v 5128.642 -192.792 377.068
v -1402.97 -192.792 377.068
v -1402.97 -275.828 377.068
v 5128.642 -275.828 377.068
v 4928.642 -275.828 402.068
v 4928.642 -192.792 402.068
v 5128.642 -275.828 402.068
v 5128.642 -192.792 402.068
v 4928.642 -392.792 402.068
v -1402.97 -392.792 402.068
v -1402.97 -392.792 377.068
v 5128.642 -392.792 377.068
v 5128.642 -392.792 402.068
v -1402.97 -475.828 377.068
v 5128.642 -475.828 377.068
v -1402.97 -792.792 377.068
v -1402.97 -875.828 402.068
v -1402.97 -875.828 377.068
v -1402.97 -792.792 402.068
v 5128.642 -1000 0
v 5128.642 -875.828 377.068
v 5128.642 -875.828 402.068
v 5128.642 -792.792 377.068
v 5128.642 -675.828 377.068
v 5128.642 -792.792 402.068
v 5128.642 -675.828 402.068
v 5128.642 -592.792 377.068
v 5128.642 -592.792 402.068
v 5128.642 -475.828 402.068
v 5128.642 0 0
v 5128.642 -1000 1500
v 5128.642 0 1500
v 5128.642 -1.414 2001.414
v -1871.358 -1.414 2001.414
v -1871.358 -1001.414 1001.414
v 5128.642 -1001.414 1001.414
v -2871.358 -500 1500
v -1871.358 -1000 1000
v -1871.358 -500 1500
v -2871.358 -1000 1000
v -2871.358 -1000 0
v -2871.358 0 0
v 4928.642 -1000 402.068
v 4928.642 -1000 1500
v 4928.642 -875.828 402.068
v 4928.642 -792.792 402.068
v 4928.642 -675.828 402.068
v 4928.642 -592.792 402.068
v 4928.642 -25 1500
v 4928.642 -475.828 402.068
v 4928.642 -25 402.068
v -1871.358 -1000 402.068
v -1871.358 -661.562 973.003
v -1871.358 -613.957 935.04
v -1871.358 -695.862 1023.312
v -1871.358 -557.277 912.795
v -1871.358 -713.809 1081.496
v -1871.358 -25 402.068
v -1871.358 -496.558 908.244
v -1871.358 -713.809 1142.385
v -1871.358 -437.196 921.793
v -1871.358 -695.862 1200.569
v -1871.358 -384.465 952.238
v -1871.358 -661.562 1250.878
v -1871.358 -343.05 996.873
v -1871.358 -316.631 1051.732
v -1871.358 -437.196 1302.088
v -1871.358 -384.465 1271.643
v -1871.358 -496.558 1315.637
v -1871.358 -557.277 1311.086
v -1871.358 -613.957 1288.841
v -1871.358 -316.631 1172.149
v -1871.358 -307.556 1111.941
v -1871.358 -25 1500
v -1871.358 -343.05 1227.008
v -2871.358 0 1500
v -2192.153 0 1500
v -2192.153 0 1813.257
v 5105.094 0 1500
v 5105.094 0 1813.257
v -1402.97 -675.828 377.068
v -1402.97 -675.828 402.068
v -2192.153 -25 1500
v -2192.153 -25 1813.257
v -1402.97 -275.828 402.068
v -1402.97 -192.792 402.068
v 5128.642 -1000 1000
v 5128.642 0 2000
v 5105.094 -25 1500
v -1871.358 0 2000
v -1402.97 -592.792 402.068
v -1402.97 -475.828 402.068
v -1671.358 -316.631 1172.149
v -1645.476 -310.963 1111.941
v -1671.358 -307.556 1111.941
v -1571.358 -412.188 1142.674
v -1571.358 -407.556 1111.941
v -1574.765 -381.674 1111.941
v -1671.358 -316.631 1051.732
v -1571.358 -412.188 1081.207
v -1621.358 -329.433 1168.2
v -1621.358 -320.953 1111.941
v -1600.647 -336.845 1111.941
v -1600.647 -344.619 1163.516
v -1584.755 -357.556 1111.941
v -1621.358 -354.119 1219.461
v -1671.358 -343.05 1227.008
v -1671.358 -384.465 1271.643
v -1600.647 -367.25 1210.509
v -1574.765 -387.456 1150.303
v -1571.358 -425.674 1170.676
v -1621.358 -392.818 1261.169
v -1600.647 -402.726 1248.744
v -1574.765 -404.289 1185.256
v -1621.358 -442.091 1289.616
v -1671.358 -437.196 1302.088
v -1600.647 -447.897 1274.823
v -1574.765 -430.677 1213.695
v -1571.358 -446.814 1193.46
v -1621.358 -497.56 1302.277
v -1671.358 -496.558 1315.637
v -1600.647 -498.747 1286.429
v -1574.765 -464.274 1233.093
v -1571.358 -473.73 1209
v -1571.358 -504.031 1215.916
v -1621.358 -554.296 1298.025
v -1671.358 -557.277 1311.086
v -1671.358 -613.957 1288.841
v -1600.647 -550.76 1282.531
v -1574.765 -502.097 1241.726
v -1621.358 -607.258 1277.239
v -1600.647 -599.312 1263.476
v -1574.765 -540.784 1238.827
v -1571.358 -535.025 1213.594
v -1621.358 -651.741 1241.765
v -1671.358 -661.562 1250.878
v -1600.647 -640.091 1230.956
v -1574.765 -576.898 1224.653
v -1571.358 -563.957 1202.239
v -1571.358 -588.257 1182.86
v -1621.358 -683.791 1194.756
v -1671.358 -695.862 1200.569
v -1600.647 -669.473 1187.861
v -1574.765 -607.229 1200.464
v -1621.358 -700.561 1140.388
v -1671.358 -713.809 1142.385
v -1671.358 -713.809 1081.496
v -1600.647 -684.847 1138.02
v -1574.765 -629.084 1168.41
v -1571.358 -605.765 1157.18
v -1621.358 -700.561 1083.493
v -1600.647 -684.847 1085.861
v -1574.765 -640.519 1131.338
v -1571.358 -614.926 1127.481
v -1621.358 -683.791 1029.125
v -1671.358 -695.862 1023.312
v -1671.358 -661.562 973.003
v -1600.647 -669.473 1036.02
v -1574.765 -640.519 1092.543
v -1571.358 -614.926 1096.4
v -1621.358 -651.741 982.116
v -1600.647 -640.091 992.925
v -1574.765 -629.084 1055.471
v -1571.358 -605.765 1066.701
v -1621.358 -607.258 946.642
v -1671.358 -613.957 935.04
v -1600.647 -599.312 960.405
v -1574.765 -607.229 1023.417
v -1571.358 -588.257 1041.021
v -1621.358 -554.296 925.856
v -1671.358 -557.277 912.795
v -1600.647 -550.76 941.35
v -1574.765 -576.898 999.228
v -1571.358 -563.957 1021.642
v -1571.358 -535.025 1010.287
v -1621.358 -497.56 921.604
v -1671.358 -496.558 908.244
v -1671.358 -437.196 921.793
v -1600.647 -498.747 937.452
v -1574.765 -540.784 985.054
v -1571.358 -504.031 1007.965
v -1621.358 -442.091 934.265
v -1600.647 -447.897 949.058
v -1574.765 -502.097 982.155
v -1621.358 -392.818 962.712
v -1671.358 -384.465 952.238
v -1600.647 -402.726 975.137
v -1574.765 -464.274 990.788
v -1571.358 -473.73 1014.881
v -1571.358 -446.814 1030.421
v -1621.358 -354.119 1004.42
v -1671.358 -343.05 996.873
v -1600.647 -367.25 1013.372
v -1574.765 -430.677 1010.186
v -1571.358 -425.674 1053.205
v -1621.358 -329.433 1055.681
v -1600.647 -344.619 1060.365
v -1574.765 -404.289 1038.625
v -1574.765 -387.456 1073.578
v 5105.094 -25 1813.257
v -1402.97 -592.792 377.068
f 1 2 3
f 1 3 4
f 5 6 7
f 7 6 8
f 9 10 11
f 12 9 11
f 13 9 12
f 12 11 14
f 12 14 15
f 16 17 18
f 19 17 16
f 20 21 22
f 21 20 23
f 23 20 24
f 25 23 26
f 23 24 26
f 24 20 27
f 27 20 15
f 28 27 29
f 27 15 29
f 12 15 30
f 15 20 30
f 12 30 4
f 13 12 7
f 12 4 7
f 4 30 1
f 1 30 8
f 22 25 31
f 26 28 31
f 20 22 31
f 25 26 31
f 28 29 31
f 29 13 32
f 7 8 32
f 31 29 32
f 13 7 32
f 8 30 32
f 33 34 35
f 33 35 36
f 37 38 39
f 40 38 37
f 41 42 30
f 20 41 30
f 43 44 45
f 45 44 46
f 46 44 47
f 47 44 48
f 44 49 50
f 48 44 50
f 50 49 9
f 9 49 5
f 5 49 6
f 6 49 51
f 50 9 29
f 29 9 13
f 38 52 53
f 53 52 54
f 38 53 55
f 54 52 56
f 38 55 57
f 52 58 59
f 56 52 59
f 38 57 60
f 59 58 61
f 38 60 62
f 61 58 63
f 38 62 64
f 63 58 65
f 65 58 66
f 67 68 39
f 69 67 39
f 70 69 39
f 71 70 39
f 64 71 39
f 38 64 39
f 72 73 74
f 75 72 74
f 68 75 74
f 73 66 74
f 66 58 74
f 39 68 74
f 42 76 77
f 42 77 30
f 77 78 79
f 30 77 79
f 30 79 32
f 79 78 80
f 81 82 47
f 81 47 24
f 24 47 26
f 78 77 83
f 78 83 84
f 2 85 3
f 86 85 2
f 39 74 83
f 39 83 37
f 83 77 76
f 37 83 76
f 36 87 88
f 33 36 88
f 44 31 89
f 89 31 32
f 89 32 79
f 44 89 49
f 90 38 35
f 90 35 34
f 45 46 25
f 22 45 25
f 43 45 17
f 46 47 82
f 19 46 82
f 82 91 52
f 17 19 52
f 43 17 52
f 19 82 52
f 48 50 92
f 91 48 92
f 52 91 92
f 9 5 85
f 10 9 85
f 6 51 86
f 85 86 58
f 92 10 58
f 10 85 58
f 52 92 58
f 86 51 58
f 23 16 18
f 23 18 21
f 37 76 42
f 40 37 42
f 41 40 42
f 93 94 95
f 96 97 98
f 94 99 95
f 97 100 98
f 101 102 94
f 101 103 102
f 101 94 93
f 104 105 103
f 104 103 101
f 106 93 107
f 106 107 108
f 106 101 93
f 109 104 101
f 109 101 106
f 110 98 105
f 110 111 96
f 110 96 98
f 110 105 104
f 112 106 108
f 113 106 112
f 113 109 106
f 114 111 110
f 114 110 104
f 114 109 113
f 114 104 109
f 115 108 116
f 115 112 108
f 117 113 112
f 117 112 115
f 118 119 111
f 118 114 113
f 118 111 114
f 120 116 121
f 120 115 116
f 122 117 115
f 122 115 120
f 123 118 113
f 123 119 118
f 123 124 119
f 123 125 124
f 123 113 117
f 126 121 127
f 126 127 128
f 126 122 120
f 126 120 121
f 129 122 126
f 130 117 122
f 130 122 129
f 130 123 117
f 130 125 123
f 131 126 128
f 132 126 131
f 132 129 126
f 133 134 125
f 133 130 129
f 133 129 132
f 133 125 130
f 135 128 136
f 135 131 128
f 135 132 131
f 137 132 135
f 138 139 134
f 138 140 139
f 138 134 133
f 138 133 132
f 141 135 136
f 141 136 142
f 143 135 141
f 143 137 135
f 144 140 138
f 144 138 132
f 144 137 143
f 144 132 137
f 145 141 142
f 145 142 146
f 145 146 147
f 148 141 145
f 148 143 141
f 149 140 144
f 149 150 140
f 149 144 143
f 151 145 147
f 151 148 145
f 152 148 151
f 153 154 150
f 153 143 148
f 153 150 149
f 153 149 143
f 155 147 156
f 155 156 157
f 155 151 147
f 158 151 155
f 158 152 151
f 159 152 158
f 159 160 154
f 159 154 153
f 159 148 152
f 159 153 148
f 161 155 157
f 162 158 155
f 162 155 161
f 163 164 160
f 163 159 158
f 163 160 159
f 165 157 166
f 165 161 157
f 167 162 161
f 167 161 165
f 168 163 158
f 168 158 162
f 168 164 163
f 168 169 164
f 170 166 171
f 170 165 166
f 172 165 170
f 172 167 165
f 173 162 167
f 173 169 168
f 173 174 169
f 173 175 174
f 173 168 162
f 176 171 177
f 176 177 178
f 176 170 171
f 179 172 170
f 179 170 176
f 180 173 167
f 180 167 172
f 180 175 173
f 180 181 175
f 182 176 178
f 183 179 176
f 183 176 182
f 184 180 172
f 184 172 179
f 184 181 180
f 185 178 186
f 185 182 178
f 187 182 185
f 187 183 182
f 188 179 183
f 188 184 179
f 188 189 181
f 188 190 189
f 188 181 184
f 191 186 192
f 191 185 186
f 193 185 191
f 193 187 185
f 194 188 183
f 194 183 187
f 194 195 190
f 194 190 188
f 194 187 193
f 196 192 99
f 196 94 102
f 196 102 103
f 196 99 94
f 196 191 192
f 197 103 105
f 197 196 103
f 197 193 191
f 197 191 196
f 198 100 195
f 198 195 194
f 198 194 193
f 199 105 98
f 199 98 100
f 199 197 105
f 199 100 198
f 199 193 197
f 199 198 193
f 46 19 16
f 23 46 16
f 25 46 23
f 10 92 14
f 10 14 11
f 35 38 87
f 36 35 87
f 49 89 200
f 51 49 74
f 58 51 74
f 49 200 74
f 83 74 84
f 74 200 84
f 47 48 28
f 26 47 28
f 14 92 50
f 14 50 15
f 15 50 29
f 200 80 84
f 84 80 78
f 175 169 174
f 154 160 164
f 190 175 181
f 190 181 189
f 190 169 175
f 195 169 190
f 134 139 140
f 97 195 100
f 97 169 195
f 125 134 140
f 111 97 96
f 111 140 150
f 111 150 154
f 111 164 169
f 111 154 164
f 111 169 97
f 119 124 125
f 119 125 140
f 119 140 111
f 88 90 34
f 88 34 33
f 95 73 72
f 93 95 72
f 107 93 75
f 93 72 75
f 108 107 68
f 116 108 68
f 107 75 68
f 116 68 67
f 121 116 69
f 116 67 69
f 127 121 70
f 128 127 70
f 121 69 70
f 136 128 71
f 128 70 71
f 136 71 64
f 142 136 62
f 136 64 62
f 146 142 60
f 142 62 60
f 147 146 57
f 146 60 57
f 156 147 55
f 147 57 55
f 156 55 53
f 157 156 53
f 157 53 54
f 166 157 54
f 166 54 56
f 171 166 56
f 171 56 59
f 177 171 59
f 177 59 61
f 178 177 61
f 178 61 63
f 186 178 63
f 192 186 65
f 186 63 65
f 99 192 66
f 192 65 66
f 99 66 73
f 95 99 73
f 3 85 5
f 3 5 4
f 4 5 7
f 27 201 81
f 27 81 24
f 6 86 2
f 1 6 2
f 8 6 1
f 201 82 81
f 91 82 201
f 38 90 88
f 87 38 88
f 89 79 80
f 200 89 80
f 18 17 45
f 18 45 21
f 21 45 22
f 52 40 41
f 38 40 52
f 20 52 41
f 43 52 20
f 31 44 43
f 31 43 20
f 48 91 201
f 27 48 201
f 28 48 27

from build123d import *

# Parameters (mm, degrees)
F1_DEPTH  = 1000
F2_W      = 7297.247172
F2_H      = 1572.696477
F3_DEPTH  = 25
F4_R      = 204.2673
F5_DEPTH  = 300
F6_SIZE   = 500
F7_R      = 100
F8_W      = 7151.451826
F8_H      = 83.035737
F9_DEPTH  = 25
F10_W     = 7000
F10_H     = 1414.213562
F11_DEPTH = 2


with BuildPart() as f1:
    # F0 (on Front) → F1 (new body)
    with BuildSketch(Plane.XZ):
        Polygon((-1871.357652, 1500), (-2871.357652, 1500), (-2871.357652, 0), (5128.642348, 0), (5128.642348, 1500), (4928.642348, 1500), (4928.642348, 402.068209), (-1871.357652, 402.068209), align=None)
    extrude(amount=F1_DEPTH)

    # F2 (on face) → F3 (join)
    with BuildSketch(Plane(origin=(0, 0, 0), x_dir=(-1, 0, 0), z_dir=(0, 1, 0))):
        with Locations((-1456.470847, 1026.908978)):
            Rectangle(F2_W, F2_H)
    extrude(amount=-F3_DEPTH)

    # F4 (on face) → F5 (join)
    with BuildSketch(Plane.YZ.offset(-1871.357652)):
        with Locations((-511.823237, 1111.940503)):
            Circle(F4_R)
    extrude(amount=F5_DEPTH)

    # F6
    f6_edges = [f1.edges().sort_by_distance(p)[0] for p in [
        (-2371.357652, -1000, 1500),
    ]]
    chamfer(f6_edges, length=F6_SIZE)

    # F7
    f7_edges = [f1.edges().sort_by_distance(p)[0] for p in [
        (-1571.357652, -716.090537, 1111.940503),
    ]]
    fillet(f7_edges, radius=F7_R)

    # F8 (on face) → F9 (cut)
    with BuildSketch(Plane.XY.offset(402.068209)):
        with Locations((2172.755837, -234.309956)):
            Rectangle(F8_W, F8_H)
        with Locations((2172.755837, -434.309956)):
            Rectangle(F8_W, F8_H)
        with Locations((2172.755837, -634.309956)):
            Rectangle(F8_W, F8_H)
        with Locations((2172.755837, -834.309956)):
            Rectangle(F8_W, F8_H)
    extrude(amount=-F9_DEPTH, mode=Mode.SUBTRACT)


with BuildPart() as f11:
    # F10 (on face) → F11 (new body)
    with BuildSketch(Plane(origin=(0, -1000, 1000), x_dir=(1, 0, 0), z_dir=(0, -0.707107, 0.707107))):
        with Locations((1628.642348, 707.106781)):
            Rectangle(F10_W, F10_H)
    extrude(amount=F11_DEPTH)


solid = Compound([f1.part, f11.part])
